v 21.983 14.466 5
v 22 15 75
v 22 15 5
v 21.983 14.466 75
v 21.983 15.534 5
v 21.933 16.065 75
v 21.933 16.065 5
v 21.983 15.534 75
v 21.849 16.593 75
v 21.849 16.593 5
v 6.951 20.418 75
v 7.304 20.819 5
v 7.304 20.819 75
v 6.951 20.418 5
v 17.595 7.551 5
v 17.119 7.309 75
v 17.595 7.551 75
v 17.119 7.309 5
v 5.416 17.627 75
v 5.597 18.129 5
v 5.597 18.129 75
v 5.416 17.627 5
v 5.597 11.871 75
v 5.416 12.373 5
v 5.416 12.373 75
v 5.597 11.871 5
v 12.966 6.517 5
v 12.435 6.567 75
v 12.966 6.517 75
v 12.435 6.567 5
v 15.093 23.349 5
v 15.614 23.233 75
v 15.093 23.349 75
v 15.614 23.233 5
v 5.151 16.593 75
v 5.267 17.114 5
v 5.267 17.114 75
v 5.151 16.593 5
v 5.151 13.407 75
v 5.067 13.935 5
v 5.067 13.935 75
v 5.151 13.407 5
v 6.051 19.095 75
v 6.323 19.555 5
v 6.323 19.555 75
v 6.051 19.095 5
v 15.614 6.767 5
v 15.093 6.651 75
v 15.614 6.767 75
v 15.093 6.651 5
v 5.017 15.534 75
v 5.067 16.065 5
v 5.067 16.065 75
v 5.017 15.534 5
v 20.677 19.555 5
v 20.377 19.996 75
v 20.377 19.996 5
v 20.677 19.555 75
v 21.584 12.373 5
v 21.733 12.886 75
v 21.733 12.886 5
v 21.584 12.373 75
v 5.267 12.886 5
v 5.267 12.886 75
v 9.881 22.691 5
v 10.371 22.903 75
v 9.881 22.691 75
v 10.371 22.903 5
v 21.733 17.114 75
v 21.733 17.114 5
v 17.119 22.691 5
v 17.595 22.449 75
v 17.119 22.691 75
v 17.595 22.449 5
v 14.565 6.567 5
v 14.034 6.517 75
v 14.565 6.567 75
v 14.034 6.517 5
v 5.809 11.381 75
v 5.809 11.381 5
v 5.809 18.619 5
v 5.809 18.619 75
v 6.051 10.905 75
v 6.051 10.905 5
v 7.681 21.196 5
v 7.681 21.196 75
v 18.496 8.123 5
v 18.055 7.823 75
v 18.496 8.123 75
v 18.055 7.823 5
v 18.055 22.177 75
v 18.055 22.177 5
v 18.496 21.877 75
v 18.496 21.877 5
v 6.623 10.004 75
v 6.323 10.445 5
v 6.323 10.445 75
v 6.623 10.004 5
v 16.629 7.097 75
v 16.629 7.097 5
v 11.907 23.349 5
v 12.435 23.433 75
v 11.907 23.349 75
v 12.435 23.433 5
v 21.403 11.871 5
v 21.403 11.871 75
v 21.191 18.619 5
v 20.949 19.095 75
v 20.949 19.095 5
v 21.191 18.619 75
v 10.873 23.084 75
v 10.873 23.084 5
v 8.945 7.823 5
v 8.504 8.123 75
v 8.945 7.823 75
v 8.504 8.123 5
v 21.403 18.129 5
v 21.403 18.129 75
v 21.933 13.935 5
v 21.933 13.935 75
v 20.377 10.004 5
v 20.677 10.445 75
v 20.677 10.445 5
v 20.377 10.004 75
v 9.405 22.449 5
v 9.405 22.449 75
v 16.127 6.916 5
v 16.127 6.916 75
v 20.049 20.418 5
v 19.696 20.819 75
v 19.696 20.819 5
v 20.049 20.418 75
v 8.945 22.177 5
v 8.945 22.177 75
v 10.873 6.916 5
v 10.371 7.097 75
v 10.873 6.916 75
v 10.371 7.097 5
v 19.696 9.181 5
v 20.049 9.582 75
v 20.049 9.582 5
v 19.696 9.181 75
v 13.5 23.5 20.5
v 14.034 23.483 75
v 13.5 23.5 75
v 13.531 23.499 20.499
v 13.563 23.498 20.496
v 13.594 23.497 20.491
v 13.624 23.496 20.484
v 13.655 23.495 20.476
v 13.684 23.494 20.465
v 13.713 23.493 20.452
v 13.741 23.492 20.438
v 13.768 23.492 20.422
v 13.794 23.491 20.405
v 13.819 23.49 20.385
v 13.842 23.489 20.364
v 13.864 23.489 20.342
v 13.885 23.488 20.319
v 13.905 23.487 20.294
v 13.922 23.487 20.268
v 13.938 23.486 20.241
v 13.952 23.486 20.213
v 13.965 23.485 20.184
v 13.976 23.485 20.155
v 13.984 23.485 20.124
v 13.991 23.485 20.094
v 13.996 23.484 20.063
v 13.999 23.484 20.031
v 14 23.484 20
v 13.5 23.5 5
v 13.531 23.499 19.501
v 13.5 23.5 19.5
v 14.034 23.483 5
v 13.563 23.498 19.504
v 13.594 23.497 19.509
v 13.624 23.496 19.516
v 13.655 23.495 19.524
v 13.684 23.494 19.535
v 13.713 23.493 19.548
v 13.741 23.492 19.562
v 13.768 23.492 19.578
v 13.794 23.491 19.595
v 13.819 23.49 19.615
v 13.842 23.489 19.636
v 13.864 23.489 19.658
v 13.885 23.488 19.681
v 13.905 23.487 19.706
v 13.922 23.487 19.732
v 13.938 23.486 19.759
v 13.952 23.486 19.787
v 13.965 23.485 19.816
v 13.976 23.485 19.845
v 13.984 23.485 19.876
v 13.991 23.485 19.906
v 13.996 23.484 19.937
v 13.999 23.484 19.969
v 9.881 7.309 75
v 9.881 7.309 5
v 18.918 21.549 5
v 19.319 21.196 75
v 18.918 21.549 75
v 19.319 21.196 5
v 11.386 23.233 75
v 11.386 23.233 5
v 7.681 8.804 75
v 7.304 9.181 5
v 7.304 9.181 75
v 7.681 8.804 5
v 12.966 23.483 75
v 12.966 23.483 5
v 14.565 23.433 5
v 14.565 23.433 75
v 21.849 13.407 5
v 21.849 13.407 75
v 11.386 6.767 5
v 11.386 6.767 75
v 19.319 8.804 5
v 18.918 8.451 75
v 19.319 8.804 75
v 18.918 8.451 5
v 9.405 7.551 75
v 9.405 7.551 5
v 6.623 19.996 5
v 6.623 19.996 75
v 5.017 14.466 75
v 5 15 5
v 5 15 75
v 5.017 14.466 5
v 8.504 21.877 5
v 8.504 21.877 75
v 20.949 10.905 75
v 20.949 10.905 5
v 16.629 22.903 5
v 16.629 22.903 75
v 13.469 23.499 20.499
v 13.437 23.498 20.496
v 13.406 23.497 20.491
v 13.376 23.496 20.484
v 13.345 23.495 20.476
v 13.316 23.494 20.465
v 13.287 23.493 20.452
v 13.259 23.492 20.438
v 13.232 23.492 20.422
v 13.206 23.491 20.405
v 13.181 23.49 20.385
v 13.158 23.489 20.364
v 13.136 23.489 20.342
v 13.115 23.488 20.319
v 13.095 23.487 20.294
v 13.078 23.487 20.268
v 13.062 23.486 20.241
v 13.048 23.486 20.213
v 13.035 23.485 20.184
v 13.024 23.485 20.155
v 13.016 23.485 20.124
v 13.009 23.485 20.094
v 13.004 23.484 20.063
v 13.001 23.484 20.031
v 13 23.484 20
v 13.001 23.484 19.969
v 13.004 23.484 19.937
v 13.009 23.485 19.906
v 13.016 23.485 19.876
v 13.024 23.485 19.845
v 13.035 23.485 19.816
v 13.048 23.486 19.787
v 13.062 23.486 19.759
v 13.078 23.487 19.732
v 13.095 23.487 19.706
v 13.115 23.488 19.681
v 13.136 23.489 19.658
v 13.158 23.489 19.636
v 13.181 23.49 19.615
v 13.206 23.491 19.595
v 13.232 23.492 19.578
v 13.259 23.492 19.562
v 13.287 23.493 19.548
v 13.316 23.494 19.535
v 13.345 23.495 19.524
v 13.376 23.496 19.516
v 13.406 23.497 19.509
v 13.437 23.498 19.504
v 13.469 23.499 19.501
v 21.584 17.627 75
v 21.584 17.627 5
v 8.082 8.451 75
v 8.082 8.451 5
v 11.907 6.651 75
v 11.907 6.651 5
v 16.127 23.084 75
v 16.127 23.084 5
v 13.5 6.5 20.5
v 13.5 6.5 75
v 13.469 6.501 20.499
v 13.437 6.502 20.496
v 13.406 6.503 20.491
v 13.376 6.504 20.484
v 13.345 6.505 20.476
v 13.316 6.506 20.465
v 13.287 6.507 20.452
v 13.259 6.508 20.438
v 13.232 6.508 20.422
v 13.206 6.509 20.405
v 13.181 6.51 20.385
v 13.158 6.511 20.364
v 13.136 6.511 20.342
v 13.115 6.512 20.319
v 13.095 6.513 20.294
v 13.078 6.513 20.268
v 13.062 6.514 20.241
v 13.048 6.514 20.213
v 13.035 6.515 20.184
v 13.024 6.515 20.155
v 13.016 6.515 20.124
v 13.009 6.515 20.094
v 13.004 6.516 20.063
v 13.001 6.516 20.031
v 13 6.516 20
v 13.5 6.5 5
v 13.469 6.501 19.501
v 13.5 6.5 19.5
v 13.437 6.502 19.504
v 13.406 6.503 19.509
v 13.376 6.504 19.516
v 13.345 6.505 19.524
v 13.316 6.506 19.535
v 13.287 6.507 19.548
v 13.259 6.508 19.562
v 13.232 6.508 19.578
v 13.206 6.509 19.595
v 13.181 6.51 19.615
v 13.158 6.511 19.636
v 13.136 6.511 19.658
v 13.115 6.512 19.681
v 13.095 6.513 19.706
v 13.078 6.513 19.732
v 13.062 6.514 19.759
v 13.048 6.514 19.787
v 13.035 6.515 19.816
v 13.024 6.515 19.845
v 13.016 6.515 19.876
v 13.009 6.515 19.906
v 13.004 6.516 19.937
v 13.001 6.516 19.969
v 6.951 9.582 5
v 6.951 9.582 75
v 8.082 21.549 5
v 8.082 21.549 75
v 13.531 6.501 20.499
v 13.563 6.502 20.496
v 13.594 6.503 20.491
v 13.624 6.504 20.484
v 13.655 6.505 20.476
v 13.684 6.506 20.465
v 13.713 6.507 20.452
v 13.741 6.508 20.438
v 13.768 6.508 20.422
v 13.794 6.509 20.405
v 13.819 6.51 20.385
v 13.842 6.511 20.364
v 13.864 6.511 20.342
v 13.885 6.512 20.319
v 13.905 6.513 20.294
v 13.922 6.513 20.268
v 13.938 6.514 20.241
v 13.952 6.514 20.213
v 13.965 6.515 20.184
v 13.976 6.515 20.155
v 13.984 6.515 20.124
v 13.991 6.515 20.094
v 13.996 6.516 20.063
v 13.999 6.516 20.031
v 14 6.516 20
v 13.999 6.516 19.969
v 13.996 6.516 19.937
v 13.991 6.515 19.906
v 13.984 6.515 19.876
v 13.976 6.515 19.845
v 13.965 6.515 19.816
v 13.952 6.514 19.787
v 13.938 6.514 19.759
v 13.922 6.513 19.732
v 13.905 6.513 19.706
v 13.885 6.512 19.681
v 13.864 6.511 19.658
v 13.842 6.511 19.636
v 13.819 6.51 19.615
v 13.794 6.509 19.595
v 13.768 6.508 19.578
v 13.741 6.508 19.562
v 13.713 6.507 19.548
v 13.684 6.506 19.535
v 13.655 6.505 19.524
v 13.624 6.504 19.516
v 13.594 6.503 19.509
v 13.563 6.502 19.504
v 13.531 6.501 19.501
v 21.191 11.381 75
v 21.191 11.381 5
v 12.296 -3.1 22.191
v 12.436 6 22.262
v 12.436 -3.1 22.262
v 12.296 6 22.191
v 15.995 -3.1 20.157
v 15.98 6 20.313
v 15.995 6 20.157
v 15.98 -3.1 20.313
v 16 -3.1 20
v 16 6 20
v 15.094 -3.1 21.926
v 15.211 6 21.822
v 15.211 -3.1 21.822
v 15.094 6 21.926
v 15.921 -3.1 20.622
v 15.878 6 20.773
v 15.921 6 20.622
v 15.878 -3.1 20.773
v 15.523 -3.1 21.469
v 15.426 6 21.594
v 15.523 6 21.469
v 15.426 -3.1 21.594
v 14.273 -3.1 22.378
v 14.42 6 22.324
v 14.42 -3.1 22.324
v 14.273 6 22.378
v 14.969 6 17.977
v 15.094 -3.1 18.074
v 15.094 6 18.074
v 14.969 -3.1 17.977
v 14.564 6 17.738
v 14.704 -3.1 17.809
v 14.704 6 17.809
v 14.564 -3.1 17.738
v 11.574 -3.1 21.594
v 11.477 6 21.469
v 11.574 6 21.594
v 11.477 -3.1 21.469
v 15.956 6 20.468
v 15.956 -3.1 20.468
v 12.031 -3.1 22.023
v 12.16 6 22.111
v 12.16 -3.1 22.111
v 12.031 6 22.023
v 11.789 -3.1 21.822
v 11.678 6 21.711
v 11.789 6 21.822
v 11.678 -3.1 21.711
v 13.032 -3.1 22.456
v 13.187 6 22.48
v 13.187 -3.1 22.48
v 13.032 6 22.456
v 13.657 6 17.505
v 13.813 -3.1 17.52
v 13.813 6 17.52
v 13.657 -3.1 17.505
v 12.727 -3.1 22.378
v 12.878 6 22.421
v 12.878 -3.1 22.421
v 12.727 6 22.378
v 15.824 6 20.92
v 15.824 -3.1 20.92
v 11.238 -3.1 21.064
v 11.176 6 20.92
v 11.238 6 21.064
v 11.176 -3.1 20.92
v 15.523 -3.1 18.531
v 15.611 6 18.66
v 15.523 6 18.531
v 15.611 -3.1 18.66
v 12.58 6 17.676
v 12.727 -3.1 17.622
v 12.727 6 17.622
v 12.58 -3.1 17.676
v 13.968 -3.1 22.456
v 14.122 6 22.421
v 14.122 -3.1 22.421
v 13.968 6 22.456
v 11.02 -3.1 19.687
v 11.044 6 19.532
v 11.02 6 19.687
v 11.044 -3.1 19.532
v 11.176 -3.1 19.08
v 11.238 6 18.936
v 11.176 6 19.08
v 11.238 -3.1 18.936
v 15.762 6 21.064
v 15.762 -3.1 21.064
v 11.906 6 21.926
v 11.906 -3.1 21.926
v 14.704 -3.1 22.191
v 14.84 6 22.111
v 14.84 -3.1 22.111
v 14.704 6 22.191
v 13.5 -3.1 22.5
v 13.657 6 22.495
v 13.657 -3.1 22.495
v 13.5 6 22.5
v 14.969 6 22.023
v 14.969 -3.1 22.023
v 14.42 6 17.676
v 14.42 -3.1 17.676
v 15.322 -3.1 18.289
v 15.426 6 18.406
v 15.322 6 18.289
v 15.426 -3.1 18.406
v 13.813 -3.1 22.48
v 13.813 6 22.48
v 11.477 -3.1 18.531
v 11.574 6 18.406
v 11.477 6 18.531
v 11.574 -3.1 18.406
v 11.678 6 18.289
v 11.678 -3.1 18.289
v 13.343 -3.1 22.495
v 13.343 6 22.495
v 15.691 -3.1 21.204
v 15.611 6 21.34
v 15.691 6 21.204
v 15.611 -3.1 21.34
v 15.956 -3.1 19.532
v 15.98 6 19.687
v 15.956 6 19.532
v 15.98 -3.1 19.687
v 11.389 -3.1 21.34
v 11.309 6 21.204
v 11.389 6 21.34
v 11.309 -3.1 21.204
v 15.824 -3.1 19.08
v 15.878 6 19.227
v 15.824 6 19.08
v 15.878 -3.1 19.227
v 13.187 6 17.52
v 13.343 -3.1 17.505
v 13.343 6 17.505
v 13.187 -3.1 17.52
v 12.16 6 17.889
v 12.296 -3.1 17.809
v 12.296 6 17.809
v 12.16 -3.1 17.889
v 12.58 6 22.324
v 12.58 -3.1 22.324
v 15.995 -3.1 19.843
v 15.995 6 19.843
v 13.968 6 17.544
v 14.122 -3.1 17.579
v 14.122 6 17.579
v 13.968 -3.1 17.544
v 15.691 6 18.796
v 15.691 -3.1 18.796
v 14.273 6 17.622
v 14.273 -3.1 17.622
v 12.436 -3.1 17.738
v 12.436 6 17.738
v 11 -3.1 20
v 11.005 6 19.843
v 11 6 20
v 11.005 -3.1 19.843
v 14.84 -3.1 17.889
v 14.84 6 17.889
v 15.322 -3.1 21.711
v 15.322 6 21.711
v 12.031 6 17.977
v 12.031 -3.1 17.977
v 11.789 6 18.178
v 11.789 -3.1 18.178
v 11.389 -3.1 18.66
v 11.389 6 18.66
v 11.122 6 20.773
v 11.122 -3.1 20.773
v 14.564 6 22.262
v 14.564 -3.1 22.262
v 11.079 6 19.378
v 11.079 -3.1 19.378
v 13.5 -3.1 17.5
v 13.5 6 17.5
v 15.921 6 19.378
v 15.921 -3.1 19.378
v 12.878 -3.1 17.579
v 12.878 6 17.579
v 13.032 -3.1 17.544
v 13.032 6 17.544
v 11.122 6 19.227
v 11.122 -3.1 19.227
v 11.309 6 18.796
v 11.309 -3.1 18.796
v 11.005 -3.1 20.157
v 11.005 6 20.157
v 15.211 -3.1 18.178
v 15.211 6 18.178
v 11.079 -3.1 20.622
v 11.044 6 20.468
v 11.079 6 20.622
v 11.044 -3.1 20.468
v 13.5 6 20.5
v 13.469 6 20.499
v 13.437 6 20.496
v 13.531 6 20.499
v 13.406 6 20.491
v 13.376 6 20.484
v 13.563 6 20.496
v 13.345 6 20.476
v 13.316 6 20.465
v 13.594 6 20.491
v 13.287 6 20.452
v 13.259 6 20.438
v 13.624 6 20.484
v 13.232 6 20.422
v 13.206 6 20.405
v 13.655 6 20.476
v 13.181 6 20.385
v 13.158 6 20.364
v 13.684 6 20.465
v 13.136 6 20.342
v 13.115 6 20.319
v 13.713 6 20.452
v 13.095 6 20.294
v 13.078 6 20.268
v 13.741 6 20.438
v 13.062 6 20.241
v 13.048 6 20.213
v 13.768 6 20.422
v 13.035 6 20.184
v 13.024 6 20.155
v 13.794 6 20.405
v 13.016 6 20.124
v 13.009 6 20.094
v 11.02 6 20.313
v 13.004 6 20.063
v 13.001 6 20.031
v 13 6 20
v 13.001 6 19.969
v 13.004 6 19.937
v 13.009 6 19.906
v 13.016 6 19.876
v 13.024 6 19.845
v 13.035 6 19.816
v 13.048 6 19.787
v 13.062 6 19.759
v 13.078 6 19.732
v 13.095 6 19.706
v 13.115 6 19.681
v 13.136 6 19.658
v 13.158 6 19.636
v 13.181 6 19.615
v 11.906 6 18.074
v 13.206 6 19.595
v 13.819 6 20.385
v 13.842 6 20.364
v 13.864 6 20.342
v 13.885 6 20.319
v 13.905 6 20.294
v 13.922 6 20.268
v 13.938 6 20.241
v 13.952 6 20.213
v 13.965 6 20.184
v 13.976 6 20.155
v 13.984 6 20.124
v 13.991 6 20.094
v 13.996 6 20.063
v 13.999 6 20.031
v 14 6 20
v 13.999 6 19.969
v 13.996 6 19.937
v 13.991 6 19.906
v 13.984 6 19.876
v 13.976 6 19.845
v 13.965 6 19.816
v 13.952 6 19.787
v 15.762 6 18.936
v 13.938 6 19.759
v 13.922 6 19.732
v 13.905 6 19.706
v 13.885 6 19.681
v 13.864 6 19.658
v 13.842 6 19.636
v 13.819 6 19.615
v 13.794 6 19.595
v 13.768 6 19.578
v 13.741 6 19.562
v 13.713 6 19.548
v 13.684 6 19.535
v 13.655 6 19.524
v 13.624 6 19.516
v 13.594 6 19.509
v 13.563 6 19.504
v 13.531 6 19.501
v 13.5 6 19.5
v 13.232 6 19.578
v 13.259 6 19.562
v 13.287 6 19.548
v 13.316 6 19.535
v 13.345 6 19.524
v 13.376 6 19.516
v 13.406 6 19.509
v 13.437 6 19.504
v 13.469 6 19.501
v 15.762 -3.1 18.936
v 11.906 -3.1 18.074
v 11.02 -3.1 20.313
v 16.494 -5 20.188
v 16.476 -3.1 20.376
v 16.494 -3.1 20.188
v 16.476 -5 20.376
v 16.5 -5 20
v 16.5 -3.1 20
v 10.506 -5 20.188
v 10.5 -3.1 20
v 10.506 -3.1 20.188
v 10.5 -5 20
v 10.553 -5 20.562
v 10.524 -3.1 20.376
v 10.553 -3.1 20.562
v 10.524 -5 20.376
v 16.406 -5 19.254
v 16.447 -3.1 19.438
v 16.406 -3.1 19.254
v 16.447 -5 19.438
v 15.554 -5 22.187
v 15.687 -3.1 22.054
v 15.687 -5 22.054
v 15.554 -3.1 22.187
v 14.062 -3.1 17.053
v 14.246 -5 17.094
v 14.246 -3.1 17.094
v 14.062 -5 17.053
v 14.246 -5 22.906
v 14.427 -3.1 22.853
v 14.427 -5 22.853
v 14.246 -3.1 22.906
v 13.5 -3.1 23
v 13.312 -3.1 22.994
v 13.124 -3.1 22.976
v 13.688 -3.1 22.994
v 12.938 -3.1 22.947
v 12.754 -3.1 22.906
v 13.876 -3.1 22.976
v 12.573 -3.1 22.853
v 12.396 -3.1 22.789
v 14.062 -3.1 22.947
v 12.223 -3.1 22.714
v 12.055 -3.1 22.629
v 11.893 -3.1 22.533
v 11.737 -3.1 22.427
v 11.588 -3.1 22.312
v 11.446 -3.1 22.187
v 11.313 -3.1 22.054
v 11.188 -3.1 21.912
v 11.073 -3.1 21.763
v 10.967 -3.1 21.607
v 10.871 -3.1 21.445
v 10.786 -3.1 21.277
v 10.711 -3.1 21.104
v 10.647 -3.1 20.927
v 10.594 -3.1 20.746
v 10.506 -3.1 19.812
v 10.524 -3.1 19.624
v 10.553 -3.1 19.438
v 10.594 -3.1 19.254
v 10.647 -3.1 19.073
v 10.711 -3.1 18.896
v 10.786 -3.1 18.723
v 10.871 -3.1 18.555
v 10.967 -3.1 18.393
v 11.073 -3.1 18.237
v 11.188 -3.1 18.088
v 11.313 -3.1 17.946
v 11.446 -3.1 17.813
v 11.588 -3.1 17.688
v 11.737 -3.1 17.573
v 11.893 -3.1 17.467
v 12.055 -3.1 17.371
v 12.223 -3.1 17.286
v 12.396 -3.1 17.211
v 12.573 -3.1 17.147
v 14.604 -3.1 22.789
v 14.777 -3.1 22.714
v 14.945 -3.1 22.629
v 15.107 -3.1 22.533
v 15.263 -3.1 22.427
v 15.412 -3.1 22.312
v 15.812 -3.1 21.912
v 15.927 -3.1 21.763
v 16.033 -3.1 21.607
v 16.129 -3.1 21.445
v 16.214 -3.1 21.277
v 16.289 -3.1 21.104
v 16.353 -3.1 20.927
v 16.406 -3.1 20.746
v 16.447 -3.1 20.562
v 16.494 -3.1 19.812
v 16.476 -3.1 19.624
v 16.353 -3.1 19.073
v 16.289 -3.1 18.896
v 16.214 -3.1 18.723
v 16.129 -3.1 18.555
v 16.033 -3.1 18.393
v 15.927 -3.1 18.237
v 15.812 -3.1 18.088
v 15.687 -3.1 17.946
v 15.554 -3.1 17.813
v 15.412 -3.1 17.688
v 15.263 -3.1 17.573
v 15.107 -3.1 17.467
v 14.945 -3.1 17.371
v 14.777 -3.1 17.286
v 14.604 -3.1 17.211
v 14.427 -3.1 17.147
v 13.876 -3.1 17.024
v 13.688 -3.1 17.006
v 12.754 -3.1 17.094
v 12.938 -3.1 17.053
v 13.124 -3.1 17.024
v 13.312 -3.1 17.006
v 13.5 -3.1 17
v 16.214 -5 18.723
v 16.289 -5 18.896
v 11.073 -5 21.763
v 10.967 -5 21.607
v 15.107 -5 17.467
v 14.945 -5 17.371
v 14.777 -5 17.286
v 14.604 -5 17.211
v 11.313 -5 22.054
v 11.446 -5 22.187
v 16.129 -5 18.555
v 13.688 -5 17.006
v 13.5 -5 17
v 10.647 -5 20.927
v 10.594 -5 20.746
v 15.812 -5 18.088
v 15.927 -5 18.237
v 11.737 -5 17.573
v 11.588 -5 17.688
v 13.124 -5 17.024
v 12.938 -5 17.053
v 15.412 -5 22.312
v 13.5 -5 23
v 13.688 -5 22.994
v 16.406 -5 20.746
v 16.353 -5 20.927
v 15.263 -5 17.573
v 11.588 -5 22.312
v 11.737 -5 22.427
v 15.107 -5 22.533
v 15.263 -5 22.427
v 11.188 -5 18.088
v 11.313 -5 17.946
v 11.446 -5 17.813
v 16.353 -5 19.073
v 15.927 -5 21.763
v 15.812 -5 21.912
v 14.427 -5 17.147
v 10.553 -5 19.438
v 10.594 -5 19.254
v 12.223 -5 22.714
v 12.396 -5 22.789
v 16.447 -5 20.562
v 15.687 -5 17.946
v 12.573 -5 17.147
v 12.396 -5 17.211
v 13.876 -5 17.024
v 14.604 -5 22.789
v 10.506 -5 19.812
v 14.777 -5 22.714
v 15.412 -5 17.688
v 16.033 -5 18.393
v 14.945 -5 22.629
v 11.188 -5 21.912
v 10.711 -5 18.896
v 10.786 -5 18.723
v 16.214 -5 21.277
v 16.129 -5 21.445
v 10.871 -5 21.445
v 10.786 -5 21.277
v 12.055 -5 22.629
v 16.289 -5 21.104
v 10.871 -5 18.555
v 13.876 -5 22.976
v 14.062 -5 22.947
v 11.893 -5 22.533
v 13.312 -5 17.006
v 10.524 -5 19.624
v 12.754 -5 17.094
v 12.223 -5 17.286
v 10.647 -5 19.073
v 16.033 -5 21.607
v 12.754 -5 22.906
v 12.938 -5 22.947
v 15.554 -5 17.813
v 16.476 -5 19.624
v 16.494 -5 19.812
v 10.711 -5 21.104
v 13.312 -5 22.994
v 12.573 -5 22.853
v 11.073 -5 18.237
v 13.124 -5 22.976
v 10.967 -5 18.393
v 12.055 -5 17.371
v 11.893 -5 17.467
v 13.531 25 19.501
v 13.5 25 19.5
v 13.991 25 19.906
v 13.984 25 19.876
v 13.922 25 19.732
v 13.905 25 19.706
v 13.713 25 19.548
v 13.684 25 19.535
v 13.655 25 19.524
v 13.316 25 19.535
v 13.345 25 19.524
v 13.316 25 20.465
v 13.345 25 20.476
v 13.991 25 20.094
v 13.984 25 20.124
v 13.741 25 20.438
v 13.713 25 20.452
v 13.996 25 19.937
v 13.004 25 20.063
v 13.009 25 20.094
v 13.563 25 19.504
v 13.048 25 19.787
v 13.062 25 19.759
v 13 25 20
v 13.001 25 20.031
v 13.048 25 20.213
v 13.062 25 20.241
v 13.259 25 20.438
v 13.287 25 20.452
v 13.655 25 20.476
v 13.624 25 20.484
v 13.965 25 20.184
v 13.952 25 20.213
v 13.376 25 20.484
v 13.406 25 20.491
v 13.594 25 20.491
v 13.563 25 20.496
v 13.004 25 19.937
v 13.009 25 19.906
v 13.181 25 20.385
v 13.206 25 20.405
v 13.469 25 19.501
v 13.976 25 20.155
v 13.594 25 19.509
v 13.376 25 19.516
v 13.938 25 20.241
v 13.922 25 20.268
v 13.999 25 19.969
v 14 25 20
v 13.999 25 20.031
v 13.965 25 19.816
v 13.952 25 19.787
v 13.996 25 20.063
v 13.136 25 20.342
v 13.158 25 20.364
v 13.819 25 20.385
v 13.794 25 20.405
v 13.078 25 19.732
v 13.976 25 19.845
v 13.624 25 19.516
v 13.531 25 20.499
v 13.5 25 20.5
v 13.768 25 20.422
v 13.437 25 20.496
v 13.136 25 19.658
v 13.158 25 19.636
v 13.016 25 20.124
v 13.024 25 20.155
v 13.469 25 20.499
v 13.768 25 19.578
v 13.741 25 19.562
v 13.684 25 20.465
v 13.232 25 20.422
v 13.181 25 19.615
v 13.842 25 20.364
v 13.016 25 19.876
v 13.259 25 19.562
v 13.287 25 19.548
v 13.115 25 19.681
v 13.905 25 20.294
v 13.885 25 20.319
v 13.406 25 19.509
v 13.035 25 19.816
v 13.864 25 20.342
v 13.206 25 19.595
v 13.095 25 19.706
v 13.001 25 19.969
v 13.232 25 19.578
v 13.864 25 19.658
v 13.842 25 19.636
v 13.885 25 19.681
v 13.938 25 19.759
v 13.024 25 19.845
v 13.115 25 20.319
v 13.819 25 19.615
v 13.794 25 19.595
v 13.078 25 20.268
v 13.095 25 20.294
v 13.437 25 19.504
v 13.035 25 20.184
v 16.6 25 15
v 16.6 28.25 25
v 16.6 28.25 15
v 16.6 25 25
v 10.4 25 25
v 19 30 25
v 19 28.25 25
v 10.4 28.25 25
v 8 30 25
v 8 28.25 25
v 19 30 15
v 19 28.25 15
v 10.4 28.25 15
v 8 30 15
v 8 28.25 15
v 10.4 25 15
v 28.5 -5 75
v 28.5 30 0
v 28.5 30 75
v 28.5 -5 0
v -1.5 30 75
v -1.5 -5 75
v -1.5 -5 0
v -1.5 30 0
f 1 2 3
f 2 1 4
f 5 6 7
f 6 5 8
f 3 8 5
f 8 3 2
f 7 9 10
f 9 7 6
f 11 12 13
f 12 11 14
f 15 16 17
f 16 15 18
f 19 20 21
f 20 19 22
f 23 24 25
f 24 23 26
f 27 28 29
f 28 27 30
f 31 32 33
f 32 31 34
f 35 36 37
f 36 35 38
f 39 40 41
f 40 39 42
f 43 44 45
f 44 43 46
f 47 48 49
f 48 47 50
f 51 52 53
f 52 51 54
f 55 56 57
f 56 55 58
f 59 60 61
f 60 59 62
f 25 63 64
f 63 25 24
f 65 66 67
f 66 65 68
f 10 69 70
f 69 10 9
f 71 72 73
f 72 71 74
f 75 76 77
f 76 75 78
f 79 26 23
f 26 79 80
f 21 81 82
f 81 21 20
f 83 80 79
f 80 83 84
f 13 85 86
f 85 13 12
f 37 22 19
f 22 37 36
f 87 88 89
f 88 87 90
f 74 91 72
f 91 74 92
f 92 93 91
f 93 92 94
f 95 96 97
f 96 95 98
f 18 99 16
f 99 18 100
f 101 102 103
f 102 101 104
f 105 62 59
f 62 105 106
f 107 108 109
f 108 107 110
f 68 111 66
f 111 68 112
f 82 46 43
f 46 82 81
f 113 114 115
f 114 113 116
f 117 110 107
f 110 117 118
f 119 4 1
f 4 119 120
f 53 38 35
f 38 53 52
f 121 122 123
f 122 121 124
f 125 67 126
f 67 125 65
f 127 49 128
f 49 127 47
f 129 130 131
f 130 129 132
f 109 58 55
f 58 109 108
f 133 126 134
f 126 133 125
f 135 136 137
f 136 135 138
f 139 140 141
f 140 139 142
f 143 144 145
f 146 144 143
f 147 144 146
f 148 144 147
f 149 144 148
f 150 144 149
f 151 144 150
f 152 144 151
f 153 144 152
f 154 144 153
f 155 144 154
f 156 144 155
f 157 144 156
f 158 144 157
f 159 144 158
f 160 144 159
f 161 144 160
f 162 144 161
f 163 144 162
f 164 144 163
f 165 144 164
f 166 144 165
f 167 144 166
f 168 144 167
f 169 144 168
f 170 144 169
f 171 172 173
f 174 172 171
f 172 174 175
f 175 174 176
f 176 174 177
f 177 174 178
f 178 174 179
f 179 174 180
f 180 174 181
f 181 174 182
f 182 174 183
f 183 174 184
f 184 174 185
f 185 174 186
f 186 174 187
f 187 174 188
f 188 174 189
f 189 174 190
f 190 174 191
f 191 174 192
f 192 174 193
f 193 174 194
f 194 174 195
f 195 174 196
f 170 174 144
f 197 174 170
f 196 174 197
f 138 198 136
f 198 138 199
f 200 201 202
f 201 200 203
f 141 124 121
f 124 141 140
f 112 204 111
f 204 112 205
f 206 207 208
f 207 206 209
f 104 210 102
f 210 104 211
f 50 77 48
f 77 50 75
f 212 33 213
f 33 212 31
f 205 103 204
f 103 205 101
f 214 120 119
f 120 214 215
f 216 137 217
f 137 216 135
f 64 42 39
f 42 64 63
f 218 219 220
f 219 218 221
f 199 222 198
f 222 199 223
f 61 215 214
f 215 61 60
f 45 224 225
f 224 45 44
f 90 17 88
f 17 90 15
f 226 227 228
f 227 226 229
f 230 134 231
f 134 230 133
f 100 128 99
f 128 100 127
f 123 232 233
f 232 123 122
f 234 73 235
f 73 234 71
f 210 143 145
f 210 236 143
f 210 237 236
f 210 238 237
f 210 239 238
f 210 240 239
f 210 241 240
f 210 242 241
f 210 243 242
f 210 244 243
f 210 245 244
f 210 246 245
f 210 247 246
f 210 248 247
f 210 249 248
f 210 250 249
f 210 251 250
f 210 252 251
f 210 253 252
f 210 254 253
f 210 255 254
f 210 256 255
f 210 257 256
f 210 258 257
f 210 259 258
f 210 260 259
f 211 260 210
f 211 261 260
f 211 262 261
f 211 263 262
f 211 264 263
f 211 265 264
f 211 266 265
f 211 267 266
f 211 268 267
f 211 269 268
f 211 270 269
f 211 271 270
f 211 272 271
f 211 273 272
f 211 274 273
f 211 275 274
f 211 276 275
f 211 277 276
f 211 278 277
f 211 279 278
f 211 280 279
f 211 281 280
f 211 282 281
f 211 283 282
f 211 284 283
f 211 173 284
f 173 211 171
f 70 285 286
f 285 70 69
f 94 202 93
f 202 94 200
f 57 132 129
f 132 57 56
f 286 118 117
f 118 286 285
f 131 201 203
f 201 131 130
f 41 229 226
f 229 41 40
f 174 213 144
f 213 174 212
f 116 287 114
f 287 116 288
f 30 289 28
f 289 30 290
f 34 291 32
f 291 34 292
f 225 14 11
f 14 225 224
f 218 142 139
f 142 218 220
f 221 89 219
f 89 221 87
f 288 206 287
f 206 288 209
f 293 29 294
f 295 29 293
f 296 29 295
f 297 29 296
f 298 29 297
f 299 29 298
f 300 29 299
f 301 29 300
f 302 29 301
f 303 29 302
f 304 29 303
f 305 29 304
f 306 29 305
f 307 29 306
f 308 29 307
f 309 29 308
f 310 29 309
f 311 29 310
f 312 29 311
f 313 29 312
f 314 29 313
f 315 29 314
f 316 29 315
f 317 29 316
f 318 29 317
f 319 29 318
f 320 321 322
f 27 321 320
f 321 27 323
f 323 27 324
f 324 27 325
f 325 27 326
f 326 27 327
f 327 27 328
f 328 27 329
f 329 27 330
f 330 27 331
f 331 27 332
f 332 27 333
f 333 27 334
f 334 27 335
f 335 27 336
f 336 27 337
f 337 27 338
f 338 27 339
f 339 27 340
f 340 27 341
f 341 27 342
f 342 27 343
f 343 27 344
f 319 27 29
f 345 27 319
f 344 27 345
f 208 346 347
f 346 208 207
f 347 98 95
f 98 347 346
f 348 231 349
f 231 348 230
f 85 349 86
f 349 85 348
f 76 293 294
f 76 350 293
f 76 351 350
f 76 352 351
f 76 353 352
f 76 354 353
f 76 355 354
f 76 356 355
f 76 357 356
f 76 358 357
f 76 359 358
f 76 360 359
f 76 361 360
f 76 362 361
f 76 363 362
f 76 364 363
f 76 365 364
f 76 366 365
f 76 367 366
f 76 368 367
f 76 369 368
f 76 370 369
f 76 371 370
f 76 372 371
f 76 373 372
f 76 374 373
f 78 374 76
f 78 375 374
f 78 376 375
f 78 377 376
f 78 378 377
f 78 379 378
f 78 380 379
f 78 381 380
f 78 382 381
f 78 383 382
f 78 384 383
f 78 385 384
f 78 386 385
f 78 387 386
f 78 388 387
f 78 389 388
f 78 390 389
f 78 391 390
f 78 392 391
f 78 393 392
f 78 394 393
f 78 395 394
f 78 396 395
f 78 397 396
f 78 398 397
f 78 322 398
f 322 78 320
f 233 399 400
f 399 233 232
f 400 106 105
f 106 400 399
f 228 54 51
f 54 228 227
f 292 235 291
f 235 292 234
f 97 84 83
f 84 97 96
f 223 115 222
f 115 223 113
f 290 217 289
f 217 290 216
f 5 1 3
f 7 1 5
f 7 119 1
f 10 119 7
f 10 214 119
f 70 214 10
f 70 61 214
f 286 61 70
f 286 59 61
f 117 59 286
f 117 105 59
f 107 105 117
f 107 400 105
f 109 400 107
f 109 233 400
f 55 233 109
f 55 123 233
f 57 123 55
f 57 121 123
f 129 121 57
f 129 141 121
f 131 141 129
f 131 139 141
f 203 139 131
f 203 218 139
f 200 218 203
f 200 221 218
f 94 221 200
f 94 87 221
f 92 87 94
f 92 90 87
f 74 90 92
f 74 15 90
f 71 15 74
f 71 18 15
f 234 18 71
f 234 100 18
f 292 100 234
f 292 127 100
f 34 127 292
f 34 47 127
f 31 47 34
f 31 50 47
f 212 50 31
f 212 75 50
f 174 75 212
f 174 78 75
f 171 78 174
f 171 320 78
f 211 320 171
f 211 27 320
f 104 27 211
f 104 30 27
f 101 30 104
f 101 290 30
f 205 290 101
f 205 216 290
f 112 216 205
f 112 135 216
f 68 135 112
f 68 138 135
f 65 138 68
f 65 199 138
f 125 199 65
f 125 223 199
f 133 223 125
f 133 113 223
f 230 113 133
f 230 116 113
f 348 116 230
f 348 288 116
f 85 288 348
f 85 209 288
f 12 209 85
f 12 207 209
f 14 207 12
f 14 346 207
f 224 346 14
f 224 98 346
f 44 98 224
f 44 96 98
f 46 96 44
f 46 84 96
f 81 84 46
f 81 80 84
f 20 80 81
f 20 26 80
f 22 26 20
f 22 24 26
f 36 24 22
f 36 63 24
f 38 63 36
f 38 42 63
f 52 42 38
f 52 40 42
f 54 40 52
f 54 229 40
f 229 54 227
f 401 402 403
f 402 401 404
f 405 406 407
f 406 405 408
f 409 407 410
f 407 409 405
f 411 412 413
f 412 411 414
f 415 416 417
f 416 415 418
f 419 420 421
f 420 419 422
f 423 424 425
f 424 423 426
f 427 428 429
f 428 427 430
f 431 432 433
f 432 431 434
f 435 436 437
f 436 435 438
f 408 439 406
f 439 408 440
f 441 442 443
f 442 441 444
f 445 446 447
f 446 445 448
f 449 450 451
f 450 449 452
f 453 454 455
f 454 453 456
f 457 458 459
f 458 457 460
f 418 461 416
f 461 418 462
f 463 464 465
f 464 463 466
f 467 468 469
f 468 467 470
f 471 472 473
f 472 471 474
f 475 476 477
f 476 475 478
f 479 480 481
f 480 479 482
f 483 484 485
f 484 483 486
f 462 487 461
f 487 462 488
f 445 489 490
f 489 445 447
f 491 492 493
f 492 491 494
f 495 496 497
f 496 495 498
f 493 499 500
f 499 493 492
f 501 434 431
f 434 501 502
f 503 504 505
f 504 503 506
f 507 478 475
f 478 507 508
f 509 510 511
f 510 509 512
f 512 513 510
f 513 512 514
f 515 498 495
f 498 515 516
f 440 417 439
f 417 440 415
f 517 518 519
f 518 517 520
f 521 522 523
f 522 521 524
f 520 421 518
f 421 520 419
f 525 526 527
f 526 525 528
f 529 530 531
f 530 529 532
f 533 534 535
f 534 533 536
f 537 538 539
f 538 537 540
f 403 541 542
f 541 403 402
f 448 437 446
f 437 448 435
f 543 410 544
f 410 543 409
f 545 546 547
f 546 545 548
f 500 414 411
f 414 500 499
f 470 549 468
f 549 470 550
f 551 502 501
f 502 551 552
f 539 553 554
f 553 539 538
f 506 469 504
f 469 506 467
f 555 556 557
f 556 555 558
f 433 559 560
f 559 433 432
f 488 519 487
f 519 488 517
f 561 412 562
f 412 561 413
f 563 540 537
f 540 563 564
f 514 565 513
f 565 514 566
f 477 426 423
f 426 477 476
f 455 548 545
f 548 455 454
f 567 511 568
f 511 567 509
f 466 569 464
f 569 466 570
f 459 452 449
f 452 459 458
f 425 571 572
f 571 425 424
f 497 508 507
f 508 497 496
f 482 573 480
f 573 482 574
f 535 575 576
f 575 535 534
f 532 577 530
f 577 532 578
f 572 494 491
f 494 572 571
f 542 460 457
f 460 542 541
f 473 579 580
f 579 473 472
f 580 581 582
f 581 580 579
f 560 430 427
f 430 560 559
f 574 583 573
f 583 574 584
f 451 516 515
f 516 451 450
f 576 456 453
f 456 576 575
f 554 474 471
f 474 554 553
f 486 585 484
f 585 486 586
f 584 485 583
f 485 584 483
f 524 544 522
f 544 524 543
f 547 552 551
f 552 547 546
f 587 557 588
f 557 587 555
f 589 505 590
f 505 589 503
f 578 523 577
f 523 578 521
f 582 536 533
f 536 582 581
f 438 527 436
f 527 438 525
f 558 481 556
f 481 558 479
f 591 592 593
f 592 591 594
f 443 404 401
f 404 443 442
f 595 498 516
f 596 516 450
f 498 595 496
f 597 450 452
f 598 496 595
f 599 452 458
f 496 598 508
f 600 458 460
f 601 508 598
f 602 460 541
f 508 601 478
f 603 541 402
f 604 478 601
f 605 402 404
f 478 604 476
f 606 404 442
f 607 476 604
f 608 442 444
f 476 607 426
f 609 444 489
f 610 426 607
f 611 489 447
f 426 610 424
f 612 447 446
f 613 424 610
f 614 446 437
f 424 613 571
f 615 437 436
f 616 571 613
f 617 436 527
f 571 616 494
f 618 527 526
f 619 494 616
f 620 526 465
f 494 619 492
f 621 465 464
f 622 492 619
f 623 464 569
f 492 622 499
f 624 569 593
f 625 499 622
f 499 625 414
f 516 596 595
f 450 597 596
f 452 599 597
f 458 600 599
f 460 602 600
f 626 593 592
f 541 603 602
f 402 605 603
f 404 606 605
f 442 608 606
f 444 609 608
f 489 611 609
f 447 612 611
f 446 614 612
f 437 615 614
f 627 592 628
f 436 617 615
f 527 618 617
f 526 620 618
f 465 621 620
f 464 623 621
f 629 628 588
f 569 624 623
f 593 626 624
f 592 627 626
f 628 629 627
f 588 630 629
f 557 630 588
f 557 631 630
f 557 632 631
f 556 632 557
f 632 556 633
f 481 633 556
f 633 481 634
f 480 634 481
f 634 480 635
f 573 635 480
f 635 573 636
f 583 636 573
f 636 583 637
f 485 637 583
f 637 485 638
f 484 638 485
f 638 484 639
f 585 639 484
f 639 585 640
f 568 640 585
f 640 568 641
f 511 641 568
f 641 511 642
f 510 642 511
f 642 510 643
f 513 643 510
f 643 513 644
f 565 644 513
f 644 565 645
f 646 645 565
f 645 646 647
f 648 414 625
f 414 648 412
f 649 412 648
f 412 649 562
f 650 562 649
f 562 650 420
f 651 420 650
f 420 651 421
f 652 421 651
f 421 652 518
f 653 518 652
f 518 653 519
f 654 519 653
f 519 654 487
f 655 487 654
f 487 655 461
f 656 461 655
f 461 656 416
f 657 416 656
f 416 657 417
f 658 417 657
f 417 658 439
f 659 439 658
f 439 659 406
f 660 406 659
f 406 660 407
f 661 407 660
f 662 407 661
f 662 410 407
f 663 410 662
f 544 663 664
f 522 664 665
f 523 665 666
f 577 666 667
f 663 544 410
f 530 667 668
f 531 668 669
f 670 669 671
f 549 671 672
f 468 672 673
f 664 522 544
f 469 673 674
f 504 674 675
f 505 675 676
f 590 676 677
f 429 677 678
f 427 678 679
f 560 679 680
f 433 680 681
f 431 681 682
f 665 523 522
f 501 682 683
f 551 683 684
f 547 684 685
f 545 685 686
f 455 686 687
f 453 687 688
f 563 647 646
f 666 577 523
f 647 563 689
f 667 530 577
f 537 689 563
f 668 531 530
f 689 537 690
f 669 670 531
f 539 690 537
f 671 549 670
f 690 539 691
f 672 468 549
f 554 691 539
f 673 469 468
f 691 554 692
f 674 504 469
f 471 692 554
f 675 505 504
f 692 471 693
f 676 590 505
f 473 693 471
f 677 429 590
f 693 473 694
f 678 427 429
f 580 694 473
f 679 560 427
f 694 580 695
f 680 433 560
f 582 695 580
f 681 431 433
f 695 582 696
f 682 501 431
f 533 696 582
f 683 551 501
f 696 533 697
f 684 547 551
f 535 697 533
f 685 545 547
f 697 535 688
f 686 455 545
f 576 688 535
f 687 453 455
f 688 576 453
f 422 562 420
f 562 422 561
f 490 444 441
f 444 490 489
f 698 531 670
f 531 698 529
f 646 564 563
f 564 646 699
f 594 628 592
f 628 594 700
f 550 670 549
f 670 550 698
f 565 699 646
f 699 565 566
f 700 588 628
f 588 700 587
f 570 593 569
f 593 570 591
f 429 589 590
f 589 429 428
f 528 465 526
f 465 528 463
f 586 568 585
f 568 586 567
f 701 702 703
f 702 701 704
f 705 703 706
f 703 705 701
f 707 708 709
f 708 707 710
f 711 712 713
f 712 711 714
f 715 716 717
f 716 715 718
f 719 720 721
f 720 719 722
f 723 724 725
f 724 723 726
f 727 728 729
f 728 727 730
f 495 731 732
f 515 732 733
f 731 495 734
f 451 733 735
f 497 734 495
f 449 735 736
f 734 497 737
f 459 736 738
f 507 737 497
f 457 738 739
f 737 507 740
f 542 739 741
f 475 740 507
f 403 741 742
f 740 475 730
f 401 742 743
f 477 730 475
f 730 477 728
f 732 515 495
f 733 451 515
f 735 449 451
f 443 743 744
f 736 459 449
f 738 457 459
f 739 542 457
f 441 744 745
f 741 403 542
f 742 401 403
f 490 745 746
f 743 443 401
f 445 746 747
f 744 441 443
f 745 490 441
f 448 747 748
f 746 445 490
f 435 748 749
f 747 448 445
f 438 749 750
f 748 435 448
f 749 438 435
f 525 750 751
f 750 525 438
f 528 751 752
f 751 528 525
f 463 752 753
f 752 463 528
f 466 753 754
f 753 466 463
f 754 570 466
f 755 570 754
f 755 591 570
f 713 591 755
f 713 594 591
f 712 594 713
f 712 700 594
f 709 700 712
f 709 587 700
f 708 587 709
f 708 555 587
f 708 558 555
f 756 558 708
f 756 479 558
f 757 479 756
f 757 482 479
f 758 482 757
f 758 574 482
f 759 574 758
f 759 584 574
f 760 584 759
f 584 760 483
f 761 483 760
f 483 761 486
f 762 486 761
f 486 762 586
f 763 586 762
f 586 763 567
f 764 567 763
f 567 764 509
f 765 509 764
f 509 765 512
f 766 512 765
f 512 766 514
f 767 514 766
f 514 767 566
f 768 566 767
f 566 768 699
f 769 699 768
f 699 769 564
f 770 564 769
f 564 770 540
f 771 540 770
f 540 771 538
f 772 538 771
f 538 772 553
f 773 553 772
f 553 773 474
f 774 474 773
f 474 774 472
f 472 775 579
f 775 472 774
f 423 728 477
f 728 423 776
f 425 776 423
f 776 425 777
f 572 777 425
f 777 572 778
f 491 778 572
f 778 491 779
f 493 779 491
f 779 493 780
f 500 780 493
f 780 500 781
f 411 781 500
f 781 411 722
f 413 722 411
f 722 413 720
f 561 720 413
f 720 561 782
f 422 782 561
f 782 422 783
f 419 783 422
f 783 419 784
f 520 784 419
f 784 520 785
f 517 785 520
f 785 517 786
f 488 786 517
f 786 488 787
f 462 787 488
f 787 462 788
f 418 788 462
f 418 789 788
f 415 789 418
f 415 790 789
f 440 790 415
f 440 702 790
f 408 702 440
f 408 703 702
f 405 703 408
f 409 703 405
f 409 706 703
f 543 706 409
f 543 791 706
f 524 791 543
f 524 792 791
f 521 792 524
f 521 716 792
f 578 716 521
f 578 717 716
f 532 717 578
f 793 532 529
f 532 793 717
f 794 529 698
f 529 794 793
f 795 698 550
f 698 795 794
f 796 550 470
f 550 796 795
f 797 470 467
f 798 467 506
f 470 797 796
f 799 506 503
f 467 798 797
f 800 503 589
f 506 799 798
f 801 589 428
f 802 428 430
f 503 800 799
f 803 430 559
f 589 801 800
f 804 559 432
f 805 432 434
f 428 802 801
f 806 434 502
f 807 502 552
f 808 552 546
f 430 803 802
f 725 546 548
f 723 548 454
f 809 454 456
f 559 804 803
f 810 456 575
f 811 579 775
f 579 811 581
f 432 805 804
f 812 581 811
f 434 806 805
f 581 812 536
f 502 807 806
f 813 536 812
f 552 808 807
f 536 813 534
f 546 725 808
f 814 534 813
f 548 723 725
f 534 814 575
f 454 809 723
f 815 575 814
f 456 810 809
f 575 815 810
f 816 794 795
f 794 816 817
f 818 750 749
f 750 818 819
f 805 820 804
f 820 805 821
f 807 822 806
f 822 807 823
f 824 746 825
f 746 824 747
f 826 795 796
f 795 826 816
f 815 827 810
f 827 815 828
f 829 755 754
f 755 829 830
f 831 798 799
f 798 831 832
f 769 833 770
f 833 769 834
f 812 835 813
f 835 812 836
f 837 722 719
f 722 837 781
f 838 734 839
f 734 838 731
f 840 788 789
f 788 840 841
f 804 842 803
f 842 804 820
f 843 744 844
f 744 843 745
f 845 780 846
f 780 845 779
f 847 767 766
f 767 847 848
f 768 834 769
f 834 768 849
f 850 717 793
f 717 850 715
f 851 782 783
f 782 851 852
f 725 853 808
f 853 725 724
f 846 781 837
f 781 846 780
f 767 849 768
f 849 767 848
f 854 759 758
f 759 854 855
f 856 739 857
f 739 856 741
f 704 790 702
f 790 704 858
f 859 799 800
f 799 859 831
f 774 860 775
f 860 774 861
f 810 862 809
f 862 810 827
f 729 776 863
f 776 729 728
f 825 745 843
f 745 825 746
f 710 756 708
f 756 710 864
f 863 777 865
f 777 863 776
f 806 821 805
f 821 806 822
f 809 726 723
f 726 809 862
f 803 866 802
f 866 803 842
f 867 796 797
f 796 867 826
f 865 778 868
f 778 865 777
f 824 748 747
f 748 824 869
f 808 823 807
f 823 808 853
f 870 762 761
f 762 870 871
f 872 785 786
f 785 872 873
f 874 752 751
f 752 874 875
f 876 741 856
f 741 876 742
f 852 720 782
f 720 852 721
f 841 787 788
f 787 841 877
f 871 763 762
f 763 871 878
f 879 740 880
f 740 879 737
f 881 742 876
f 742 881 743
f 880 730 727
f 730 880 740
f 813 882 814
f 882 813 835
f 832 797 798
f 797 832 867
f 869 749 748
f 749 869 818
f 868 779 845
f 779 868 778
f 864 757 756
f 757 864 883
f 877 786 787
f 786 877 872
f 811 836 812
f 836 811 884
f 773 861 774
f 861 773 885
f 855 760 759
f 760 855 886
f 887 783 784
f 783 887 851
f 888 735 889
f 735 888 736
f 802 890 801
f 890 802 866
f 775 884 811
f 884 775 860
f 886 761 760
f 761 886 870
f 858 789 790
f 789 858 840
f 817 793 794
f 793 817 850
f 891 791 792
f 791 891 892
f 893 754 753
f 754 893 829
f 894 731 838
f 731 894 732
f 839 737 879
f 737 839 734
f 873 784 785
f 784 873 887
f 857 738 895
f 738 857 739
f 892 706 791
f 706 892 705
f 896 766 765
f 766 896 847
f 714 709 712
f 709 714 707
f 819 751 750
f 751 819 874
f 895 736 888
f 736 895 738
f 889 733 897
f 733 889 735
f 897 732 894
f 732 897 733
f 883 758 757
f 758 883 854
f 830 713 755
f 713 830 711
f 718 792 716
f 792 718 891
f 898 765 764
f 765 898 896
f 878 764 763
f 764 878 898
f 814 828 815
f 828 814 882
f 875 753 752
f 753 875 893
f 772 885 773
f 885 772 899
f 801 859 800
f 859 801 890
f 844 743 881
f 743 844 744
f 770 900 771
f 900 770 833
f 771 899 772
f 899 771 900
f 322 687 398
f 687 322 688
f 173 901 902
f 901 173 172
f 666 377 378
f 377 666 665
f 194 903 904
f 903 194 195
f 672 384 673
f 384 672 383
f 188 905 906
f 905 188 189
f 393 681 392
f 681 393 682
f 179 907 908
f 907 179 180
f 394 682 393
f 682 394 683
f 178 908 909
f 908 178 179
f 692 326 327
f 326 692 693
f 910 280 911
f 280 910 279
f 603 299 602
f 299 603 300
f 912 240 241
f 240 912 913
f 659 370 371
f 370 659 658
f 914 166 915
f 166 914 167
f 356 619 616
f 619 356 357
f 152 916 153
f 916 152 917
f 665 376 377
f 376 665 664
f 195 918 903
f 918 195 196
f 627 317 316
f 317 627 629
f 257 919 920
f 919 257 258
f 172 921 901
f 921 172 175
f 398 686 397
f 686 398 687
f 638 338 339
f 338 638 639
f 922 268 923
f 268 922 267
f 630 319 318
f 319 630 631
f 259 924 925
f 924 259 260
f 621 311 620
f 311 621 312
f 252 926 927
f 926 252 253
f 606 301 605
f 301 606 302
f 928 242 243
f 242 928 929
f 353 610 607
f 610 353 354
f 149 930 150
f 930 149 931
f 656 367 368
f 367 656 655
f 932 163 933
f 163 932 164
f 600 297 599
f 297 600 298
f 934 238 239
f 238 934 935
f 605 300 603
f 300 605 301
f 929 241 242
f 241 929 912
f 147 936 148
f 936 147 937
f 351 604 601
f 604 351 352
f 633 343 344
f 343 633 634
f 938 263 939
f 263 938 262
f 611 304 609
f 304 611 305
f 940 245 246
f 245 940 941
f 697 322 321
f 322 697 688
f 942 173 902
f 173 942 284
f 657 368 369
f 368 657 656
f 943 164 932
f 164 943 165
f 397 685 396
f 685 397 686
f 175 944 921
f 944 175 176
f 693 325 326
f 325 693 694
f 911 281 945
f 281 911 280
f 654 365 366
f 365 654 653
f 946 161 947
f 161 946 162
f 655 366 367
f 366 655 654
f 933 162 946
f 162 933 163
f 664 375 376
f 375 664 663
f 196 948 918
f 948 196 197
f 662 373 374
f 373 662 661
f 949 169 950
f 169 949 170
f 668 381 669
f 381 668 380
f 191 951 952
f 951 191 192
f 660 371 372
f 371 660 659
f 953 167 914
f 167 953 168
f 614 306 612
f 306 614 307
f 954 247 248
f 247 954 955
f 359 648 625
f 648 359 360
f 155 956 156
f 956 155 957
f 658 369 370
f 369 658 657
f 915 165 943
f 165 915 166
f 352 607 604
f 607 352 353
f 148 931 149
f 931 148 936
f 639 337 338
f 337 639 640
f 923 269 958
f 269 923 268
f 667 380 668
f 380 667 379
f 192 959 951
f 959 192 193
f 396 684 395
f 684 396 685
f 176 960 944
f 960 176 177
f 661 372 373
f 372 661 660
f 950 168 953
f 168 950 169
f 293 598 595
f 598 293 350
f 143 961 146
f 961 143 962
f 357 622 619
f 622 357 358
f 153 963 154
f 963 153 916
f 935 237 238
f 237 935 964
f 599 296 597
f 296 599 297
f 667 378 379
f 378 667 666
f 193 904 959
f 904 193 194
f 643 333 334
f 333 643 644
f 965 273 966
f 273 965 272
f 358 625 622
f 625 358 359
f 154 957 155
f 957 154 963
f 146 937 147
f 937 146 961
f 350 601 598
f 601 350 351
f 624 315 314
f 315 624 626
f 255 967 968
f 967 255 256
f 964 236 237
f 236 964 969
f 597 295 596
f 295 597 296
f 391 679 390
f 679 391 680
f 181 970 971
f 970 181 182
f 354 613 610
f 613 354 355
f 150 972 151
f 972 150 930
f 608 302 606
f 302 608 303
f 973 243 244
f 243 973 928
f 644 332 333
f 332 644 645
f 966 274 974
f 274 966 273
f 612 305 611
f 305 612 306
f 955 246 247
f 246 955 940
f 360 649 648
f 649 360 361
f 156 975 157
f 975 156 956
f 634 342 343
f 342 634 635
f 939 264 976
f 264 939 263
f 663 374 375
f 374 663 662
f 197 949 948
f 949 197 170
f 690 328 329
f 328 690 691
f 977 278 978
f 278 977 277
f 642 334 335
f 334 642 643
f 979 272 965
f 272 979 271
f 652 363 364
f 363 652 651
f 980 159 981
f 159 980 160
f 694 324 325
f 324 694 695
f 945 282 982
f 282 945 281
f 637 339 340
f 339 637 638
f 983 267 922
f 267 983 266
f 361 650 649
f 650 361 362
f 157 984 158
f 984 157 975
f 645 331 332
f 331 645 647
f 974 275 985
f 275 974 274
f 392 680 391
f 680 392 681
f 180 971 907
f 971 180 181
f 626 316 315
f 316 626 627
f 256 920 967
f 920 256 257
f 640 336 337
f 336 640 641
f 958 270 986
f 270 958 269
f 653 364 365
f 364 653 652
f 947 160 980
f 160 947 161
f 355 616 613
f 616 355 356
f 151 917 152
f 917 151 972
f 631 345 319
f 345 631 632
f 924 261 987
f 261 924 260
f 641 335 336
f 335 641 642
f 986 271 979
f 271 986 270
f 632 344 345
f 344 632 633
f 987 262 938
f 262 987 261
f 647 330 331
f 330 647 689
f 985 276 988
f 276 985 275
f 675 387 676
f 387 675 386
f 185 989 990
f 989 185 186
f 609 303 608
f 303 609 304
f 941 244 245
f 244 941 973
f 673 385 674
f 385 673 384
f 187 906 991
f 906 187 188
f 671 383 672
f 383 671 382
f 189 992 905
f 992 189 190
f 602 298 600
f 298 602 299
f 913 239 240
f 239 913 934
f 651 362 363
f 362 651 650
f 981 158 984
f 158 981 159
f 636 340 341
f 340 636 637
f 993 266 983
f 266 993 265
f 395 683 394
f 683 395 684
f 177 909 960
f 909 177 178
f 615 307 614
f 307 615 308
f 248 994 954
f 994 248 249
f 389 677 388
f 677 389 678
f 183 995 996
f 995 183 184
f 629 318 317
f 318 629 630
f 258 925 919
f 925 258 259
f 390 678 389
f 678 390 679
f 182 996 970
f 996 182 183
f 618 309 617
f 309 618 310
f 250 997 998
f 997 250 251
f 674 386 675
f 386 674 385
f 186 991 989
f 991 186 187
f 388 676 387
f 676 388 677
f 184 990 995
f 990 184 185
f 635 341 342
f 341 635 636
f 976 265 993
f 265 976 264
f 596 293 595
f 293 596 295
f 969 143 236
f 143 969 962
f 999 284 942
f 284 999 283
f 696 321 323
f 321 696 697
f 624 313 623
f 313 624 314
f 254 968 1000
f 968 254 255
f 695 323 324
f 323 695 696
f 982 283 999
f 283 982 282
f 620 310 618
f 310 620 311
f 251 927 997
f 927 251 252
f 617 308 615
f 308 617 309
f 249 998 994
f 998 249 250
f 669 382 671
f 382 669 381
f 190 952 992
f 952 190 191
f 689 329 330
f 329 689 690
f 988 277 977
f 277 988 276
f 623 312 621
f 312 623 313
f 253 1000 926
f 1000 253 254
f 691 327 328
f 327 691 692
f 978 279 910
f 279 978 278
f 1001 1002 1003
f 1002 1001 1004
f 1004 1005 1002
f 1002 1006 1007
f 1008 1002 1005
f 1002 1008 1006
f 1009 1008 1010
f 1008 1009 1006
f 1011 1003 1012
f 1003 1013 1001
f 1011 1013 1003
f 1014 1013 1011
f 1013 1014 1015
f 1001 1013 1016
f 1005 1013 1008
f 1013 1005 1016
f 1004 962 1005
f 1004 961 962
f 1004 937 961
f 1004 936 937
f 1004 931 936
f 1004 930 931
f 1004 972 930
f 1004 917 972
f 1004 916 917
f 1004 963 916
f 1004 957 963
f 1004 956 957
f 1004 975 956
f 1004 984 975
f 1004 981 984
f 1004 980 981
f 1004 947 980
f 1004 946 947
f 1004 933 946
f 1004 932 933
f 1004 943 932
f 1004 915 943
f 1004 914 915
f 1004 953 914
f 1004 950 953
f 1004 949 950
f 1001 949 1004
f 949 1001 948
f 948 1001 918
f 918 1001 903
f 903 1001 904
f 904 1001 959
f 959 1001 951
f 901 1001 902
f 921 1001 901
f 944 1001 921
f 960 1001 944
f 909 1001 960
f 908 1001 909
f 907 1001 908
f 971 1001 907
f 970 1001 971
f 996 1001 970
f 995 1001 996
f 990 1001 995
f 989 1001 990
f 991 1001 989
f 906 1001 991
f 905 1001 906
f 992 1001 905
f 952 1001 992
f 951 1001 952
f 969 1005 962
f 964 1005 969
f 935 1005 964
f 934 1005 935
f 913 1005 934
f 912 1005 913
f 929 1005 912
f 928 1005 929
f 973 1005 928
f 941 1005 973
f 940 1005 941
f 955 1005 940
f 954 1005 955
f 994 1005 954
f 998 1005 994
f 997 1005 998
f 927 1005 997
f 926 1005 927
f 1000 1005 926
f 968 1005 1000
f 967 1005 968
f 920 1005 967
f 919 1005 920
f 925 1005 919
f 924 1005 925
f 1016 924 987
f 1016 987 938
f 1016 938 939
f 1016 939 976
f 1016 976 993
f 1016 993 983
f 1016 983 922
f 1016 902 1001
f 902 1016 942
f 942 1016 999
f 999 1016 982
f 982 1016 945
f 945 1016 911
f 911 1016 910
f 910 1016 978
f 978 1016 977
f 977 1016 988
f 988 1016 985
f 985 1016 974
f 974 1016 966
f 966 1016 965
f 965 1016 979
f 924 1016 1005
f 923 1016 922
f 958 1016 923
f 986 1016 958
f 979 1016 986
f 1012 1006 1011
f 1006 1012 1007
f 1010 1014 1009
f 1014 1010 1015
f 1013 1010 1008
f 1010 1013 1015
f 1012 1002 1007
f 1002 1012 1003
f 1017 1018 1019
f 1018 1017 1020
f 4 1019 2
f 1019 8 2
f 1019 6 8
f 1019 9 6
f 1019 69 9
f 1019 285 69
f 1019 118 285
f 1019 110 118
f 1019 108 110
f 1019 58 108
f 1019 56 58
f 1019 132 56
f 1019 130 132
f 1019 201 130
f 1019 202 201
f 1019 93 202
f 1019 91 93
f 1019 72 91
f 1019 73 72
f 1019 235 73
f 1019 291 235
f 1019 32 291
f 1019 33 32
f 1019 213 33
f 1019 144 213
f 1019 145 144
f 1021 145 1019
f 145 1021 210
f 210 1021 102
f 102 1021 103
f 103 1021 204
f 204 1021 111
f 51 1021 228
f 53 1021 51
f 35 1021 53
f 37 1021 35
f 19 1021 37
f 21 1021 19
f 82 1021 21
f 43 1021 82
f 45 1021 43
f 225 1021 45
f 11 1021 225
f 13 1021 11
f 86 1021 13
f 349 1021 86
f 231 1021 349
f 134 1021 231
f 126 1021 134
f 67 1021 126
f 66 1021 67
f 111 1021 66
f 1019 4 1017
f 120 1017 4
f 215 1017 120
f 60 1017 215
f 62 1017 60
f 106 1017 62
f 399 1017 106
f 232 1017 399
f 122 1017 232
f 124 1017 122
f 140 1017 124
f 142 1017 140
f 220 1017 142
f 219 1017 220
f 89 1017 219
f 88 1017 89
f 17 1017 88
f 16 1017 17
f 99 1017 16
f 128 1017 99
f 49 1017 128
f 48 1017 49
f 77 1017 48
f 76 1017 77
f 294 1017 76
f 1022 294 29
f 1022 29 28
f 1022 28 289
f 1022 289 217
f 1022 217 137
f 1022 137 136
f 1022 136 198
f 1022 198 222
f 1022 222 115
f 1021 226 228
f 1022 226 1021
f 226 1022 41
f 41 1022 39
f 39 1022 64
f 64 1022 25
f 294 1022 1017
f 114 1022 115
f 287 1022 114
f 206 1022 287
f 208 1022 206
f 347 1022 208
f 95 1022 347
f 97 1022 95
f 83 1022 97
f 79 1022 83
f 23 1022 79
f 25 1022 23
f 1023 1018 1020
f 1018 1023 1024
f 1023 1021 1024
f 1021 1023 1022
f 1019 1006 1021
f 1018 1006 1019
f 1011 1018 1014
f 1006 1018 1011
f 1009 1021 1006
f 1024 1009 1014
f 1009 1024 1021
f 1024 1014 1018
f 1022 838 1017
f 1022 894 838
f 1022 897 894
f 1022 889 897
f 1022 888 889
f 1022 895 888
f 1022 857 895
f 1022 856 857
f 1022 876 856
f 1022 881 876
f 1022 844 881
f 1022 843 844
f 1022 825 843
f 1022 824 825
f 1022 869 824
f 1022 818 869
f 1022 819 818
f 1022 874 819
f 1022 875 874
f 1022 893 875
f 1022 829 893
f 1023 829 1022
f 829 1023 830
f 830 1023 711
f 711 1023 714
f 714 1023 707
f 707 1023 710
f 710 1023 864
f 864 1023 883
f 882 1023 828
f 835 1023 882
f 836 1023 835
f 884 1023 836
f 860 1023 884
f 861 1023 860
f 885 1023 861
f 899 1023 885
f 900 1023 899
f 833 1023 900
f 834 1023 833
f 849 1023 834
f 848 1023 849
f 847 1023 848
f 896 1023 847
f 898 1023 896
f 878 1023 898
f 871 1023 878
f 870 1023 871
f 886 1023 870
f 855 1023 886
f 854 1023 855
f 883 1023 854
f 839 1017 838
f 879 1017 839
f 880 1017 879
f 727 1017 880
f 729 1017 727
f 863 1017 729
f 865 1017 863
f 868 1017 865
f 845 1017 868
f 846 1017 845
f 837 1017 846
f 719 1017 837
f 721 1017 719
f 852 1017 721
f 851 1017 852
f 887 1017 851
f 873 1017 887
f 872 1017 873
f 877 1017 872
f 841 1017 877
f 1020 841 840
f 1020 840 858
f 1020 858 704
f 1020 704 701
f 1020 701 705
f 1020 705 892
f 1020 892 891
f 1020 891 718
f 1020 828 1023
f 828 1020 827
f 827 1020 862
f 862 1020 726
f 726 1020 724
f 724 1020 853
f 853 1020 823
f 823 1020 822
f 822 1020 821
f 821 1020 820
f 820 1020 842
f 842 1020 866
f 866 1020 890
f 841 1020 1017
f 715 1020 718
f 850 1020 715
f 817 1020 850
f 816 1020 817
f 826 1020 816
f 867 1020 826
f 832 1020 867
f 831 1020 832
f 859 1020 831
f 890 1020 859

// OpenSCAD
module example003()
{
	difference() {
		union() {
			translate([-1.5, -5, 0])
				cube([30, 35,  75], center = false);	
			//translate([25, -5, 0])
				//cube([3.5, 10, 65], center = false);	
			//translate([-1.5, 5, 0])
				//cube([3.5, 3.5, 65], center = false);
			//translate([28, 13, 0])
				//cube([2.5, 3.5, 75], center = false);
			
		}
		union() {
			translate([13.5, 15, 5])
				cylinder(h = 100, r = 8.5, center = false, $fn = 100); //tube 
			translate([13.5, 6, 20])
				rotate(90, [1, 0, 0]) cylinder(h = 20, r = 2.5, center = false, $fn = 100); //led
            translate([13.5, -3.1, 20])
				rotate(90, [1, 0, 0]) cylinder(h = 2, r = 3, center = false, $fn = 100); //led
			translate([13.5, 50, 20])
				rotate(90, [1, 0, 0]) cylinder(h = 50, r = 0.5, center = false, $fn = 100); //apature
			translate([13.5, 30, 20])
				cube([6.2, 10, 10], center = true); //sensor
			translate([13.5, 30, 20])
				cube([11, 3.5, 10], center = true); //sensor wires
			//translate([13.5, 30, 96])
				//cube([32, 8, 10], center = true);	 //multiple sensor wire channel
			//translate([13.5, 0, 70])
				//cube([4, 10, 100], center = true);	 //led wires
			//translate([13.5, 0, 96])
				//cube([32, 1, 10], center = true);	 //multiple led wire channel
			//translate([24, 28, -0.5])
				//cube([6, 5, 92], center = false);	
			//translate([-2, -2, -0.5])
				//cube([5, 4, 92], center = false);	
			//translate([-2, 13, -0.5])
				//cube([2.5, 4.5, 110], center = false);	
}
	}
}

example003();
